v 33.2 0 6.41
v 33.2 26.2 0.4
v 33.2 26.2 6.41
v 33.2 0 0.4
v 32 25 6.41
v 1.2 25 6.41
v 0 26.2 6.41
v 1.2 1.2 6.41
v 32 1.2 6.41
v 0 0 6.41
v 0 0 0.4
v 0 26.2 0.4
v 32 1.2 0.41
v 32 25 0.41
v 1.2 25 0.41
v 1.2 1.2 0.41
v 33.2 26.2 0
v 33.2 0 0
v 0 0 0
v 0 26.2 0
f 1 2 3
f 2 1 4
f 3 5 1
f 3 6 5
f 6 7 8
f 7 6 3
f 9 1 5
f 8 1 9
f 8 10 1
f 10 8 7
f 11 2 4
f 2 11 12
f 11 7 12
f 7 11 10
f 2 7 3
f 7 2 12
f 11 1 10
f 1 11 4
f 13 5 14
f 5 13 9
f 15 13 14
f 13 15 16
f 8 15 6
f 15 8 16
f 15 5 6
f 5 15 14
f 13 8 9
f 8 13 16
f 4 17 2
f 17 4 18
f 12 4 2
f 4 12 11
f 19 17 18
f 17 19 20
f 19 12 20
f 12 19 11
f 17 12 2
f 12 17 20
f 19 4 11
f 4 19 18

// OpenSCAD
// file: ../../Base/Rotation.scad
// Fischertechnik Box Foundation
// Geometry Helpers Rotation

include <PlacementOptions.scad>

// getRotatedSpace(space, rotation=NoRotation)
// Rotates the space dependent on the specified rotation

function getRotatedSpace(space, rotation=NoRotation) = [
    (rotation == Rotate90 || rotation == Rotate270) ? space.y : space.x,
    (rotation == Rotate90 || rotation == Rotate270) ? space.x : space.y
];

// Rotates the given space around the fixed left lower corner
// space = the space the children needs as width/depth list [width,depth]
// rotation = 0 Rotate0 degrees, 1 Rotate90 degrees, 2 Rotate180 degrees, 3 Rotate270 degrees (equivalent to -90)

module RotateFix(space, rotation=NoRotation) {
    dy = (rotation == Rotate0 || rotation == Rotate270) ? 0 :
        (rotation == Rotate90) ? space.x :
        space.y;
    dx = (rotation < Rotate180) ? 0 :
        (rotation == Rotate180) ? space.x :
        space.y;
    
    translate([dx, dy, 0])
        rotate([0, 0, rotations[rotation]])
            children();
}
// file: ../../Base/Alignment.scad
// Fischertechnik Box Foundation
// Geometry Helpers Alignment

include <PlacementOptions.scad>

// getAlignedX(elementWidth, spaceWidth, align=AlignRight, offset=0)
// Gets the aligned X offset of an element with the given
// width in the given space.
// elementWidth = The width of the element to positon
// spaceWidth = The space where the element should be aligned
// align = 0 AlignLeft, 1 AlignCenter, 2 AlignRight
// offset = an optional offset from the aligned position. When
// aligned left or centered, then positive values are in X direction.
// When aligned right then positive values are in negative X direction.

function getAlignedX(elementWidth, spaceWidth, align=AlignRight, offset=0) =
    (align == AlignLeft) ?
        offset :
        ((align == AlignCenter) ?
        (spaceWidth - elementWidth)/2 + offset :
        spaceWidth - offset - elementWidth);

// getAlignedY(elementDepth, spaceDepth, align=AlignTop, offset=0)
// Gets the aligned Y offset of an element with the given
// depth in the given space.
// elementDepth = The depth of the element to positon
// spaceDepth = The space where the element should be aligned
// align = 0 AlignBottom, 1 AlignCenter, 2 AlignTop
// offset = an optional offset from the aligned position. When
// aligned bottom or centered, then positive values are in Y direction.
// When aligned top then positive values are in negative Y direction.

function getAlignedY(elementDepth, spaceDepth, align=AlignTop, offset=0) =
    (align == AlignBottom) ?
        offset :
        ((align == AlignCenter) ?
        (spaceDepth - elementDepth)/2 + offset :
        spaceDepth - offset - elementDepth);
// file: ../../Base/PlacementOptions.scad
// Fischertechnik Box Foundation
// Placement Options

// Alignment
NoAlign = 0;
AlignLeft = 1;
AlignBottom = 2;
AlignCenter = 3;
AlignRight = 4;
AlignTop = 5;

// Element rotation degree steps
rotations = [0, -90, -180, -270];

// Rotation
NoRotation = 0;
Rotate0 = 0;
Rotate90 = 1;
Rotate180 = 2;
Rotate270 = 3;

// Docking (seen from above)
NoDock = -1;
DockLeft = 0;
DockTop = 1;
DockRight = 2;
DockCorner = 2;
DockBottom = 3;

// Web corners
LowerLeft = 0;
UpperLeft = 1;
UpperRight = 2;
LowerRight = 3;

// Web position relative to corner
LeftOfCorner = 0;
RightOfCorner = 1;
// file: ../../Base/Boxes.scad
// Fischertechnik Box Foundation
// Pre-designed Boxes

use <Constants.scad>

include <PlacementOptions.scad>

box190Width = 190;
box190Depth = 130;
box130Width = 130;
box130Depth = 95;

// Values are from an original ec3 box
topBottomDifference = 1.5;
outerHeight = 40;
baseThickness = 1.8;
innerHeight = outerHeight - baseThickness;
stackExcess = 5.7;
radius = 3.5;
wallThickness = 1.5;
tolerance = 0.2;

boxWallThickness = wallThickness;
boxBaseThickness = baseThickness;
boxWebWidth = 3.0;

// getBoxWallThickness()
// Gets the wall thickness of a Fischertechnik Box
function getBoxWallThickness() = boxWallThickness;

// getBoxUsageHeight(height = 38.2)
// Gets the usable height of a Fischertechnik box
// height = Outer height of the box from the bottom to the upper edge.
function getBoxUsageHeight(height = outerHeight) = height - baseThickness - stackExcess;

// getBoxInnerHeight()
// Gets the inner height of a Fischertechnik box, including the stack excess
function getBoxInnerHeight() = innerHeight;

// getBoxBaseThickness()
// Gets the thickness of the Fischertechnik box base.
function getBoxBaseThickness() = boxBaseThickness;

// getBoxWebWidth()
// Gets the width of a box web
function getBoxWebWidth() = boxWebWidth;

// getBox190Space()
// Gets the usable inner space of a Box 190 as an x/y-list
function getBox190Space() = [
    box190Width - 2*getBoxWallThickness() - topBottomDifference, 
    box190Depth - 2*getBoxWallThickness() - topBottomDifference ];

// RoundedCornerPlate(width, depth, height, radius)
// Creates a body plate with rounded corners for a box. Used
// also to create the complete box with the hull module.
// width = Width of the plate
// depth = depth of the plate 
// height = thickness of the plate
// radius = radius of the rounded corner
module RoundedCornerPlate(width, depth, height, radius) {
    translate([radius, radius])
    hull() {
        w = width-2*radius;
        d = depth-2*radius;
        cube([w, d, height]);
        cylinder(height, r=radius, $fn=getFragments());
        translate([w, 0])
            cylinder(height, r=radius, $fn=getFragments());
        translate([w, d])
            cylinder(height, r=radius, $fn=getFragments());
        translate([0, d])
            cylinder(height, r=radius, $fn=getFragments());
    }
}

// BoxBase(width, depth)
// Creates an empty stackable Fischertechnik compatible box
// width = Outer width of the box (190, 130, ...)
// depth = Outer depth of the box (130, 95, ...)

module BoxBase(width, depth, height=outerHeight) {    
    thinPlate = 0.01;

    innerHeight = height - baseThickness;    
    
    module Body(tolerance=tolerance) {
        hull() {
            // Bottom with tolerance to fit into the original boxes when stacked
            translate([-wallThickness+tolerance, -wallThickness+tolerance, -baseThickness])
                RoundedCornerPlate(width-topBottomDifference-2*tolerance, depth-topBottomDifference-2*tolerance, thinPlate, radius);
            
            // Top
            translate([-wallThickness-topBottomDifference/2, -wallThickness-topBottomDifference/2, innerHeight-thinPlate])
                RoundedCornerPlate(width, depth, thinPlate, radius);
         }
    }

    module Cutoff() {
        hull() {
            coWidth = width - 2*wallThickness;
            coDepth = depth - 2*wallThickness;
            
            // Bottom
            RoundedCornerPlate(coWidth-topBottomDifference, coDepth-topBottomDifference, thinPlate, radius);

            // Top
            translate([-topBottomDifference/2, -topBottomDifference/2, innerHeight+thinPlate]) 
                RoundedCornerPlate(coWidth, coDepth, thinPlate, radius);
        }
    }
    
    difference() {        
        Body();
        Cutoff();
        stackOffset = innerHeight - stackExcess;
        translate([0, 0, stackOffset + baseThickness])
            Body(tolerance=0);
    }
}

// Creates the Fischertechnik empty box 130x190 mm and places it at position 0,0
// 190x130 are the outer sizes, the inner space is slightly smaller. Use getBox190Space() to get the inner sizes.
// The box is positioned that the usable inner space is at the 0,0,0 position.

module Box190() {
    BoxBase(box190Width, box190Depth);
}

// Gets the usable inner space of a Box 130 as an x/y-list
function getBox130Space() = [
    box130Width - 2*getBoxWallThickness() - topBottomDifference, 
    box130Depth - 2*getBoxWallThickness() - topBottomDifference ];

// Creates the Fischertechnik empty box 95x130 mm and places it at position 0,0
// 190x130 are the outer sizes, the inner space is slightly smaller. Use getBox190Space() to get the inner sizes.
// The box is positioned that the usable inner space is at the 0,0,0 position.

module Box130() {
    BoxBase(box130Width, box130Depth);
}

// Creates a web at the specified box walls
// corner 0 = LowerLeft, 1 = UpperLeft, 2 = UpperRight, 3 = LowerRight
// side 0 = LeftOfCorner, 1 = RightOfCorner
// distance = Distance in mm from the corner
// boxSpace = inner width and depth of the box (default: Box 190)
// webWidth = length of the web (default is 3 mms)
// webThickness = thickness of the web (default is 1 mm)
// height = Height of the web (standard is getBoxUsageHeight())

module BoxWeb(corner, side, distance, boxSpace=getBox190Space(), webWidth=getBoxWebWidth(), webThickness=1.0, height=getBoxUsageHeight()) {
    sink = getBoxWallThickness()/2;

    width = (corner % 2 == 0) ? 
            (side == LeftOfCorner ? webWidth : webThickness) :
            (side == LeftOfCorner ? webThickness : webWidth);

    depth = (corner % 2 == 0) ? 
            (side == RightOfCorner ? webWidth : webThickness) :
            (side == RightOfCorner ? webThickness : webWidth);
    
    xDiff = corner == LowerLeft ? 
                (side == LeftOfCorner ? -sink : distance) :
            (corner == UpperLeft ?                
                (side == LeftOfCorner ? distance : -sink) :
            (corner == UpperRight ?
                (side == LeftOfCorner ? boxSpace.x-webWidth+sink : boxSpace.x-distance-webThickness) :
                (side == LeftOfCorner ? boxSpace.x-distance-webThickness: boxSpace.x-webWidth+sink)));

    yDiff = corner == LowerLeft ? 
                (side == RightOfCorner ? -sink : distance) :
            (corner == UpperLeft ?
                (side == RightOfCorner ? boxSpace.y-distance-webThickness : boxSpace.y-webWidth+sink) :
            (corner == UpperRight ?
                (side == RightOfCorner ? boxSpace.y-webWidth+sink : boxSpace.y-distance-webThickness) :
                (side == RightOfCorner ? distance : -sink)));
    
    translate([xDiff, yDiff, -getExcess()])
        cube([width, depth, height + 2*getExcess()]);
}
// file: ../../Base/Placement.scad
// Fischertechnik Box Foundation
// Geometry Helpers Placement

use <Constants.scad>
use <Alignment.scad>
use <Rotation.scad>
use <Boxes.scad>

include <PlacementOptions.scad>

// Place(x=0, y=0, elementSpace=[0,0], alignX=AlignLeft, alignY=AlignBottom, rotation=Rotate0, boxSpace=getBox190Space())
// Places the child at the specified position
// y = Y-Position. This is a relative position when an X aligment is specified.
// x = X-Position. This is a relative position when an Y aligment is specified.
// elementSpace = space of the element to be placed [x,y]
// alignX = -1=NoAlign, 0 AlignLeft, 1 AlignCenter, 3 AlignRight (elementSpace and boxSpace required!)
// alignY = -1=NoAlign, 2 AlignBottom, 1 AlignCenter, 4 AlignTop (elementSpace and boxSpace required!)
// rotation = 0 Rotate0 0 degrees, 1 Rotate90 90 degrees, 
// 2 Rotate180 180 degrees, 3 Rotate270 270 degrees (equivalent to -90)
// boxSpace = Inner space of the box where the placement occurs [x,y] - default is Box 190x130 inner space

module Place(x=0, y=0, elementSpace=[0,0], 
  alignX=AlignLeft, alignY=AlignBottom, 
  rotation=NoRotation, boxSpace=getBox190Space()) {

    module Position(x, y, space, rotation=Rotate0) {
        translate([x, y, 0])
            RotateFix(space, rotation)
                children();
    }

    space = getRotatedSpace(elementSpace, rotation);
    alignedX = getAlignedX(space.x, boxSpace.x, alignX, x);
    alignedY = getAlignedY(space.y, boxSpace.y, alignY, y);
    Position(alignedX, alignedY, elementSpace, rotation)
        children();
}

// Center(space=getBox130Space(), elementSpace=[0,0])
// space = Space where the children is centered. For cylinder use centered=true and no elementSpace.
// elementSpace = space of the element to be centered [x,y]

module Center(space=getBox190Space(), elementSpace=[0,0]) {
    Place(elementSpace=elementSpace, boxSpace=space, alignX=AlignCenter, alignY=AlignCenter)
        children();
}

// CenterHorizontal(width=0, y=0, offset=0, space=getBox130Space())
// width = Width of the element to be placed.
// y = Y position of the element
// offset = Offset from the center position (negative will be left of the center)
// space = Space where the element is placed

module CenterHorizontal(width=0, y=0, offset=0, space=getBox190Space()) {
    Place(x=offset, y=y, elementSpace=[width, 0], boxSpace=space, alignX=AlignCenter)
        children(0);
}

// CenterVertical(depth=0, x=0, offset=0, space=getBox130Space())
// depth = Depth of the element to be placed.
// x = X position of the element
// offset = Offset from the center position (negative will be down of the center)
// space = Space where the element is placed

module CenterVertical(depth=0, x=0, offset=0, space=getBox190Space()) {
    Place(x=x, y=offset, elementSpace=[0, depth], boxSpace=space, alignY=AlignCenter)
        children(0);
}

// getIsVertical(align)
// True if the specified alignment needs a vertical orientation for a divider (AlignRight, AlignLeft)

function getIsVertical(align) = (align == AlignRight || align == AlignLeft);

// getIsHorizontal(align)
// True if the specified alignment needs a horizontal orientation for a divider (AlignTop, AlignBottom)

function getIsHorizontal(align) = (align == AlignTop || align == AlignBottom);
// file: ../../Elements/AxisClip10.scad
// Fischertechnik Box Library
// Axis for clip 10
// 31023

use <../ModelBase/Simple.scad>
use <../Base/Constants.scad>

/* [Element Parameters] */
height = 23;
clipHeight = 10;

/* [Hidden] */
width = 12;
depth = 12;
upperDiameter = 3.6;

// getAxisClip10Space()
// Gets the space of a n axis for a clip 10 with spring ring (mot2)

function getAxisClip10Space() = [width, depth, height];

// AxisClip10(height, clipHeight)
// Axis for clip 10 with spring ring (mot2)
// height = Height of the complete axis (standard is 23, in mot3 its only 12)
// clipHeight = Height of the part for the clip (standard is 10, in mot3 its only 7)

module AxisClip10(height=height, clipHeight=clipHeight) {
    LeveledAxisWithSpace(height, height-clipHeight, getAxisClip10Space(), diameter=upperDiameter);
}

// Test
color("lightgray")
AxisClip10(height, clipHeight);
// file: ../../Base/Constants.scad
// Fischertechnik Box Foundation
// Constants

// Constant values necessary for multiple elements

// Base constants
dividerThickness = 1.2;
excess = 0.01;
fragments = 90;
tolerance = 0.8;

// Gets the thickness of a divider 
function getDividerThickness() = dividerThickness;

// Gets the excess that is used to merge walls into each other
function getExcess() = excess;

// Gets amount of fragments of a cylinder
function getFragments() = fragments;

// Gets the inner tolerance of a frame to each side
function getTolerance() = tolerance;


// Fischertechnik specific constants
axisDiameter = 4;
axisBottomDiameter = axisDiameter + 1;
axisTolerance = 0.2;

// Gets axis diameter of Fischertechnik axis
function getAxisDiameter() = axisDiameter;

// Gets axis diameter tolerance (subtracted for element axis)
function getAxisTolerance() = axisTolerance;

// Gets the axis diameter for standing axis
function getStandAxisDiameter() = getAxisDiameter() - getAxisTolerance();

// Gets axis bottom diameter for thicker part at the bottom
function getAxisBottomDiameter() = axisBottomDiameter;

standardEdgeDistance = 2.5;
standardWebDistance = 11.5;
standardCornerLength = 15;

// gets the standard distance to the wall of the box for dockable frames with webs
function getStandardEdgeDistance() = standardEdgeDistance;

// gets the standard distance of each web to the corner of the dockable frame
function getStandardWebDistance() = standardWebDistance;

// gets the standard length of the corner walls of a dockable frame
function getStandardCornerLength() = standardCornerLength;

tubeWallFactor = 0.8;

// gets the wall thickness of a tube.
function getTubeWallThickness() = tubeWallFactor * getDividerThickness();

smallPartsFrameHeight = 20;

// gets the frame height for docked small parts boxes.
function getSmallPartsFrameHeight() = smallPartsFrameHeight;

hubRingDiameter = 19.5;
hubRingLevelDiameter = 21;

// gets the diameter of a tube matching the inner ring of a wheel
function getHubRingDiameter() = hubRingDiameter;

// gets the diameter of a hub tube with a thicker diameter
function getHubRingLevelDiameter() = hubRingLevelDiameter;
// file: ../../Elements/FrameLiftingGear.scad
// Fischertechnik Box Library
// Frame for lifting gear
// 37263, 37268, 37272, 75067

use <../ModelBase/Simple.scad>

/* [Hidden] */
width = 30;
depth = 23;
height = 6;

volume = [width, depth, height];

// getFrameLiftingGearSpace()
// Gets the space the frame for the lifting gear needs

function getFrameLiftingGearSpace() = getFrameOuterVolume(volume);

// FrameLiftingGear()
// Creates a frame for a lifting gear

module FrameLiftingGear() {
    Frame(volume);
}

// Test
color("lightgray")
FrameLiftingGear();
// file: ../TestPrint.scad
// 3D Print Test Base

use <../Base/Constants.scad>

use <../Elements/AxisClip10.scad>

module TestPrint(elementSpace) {
    cube([elementSpace.x, elementSpace.y, 0.4]);
    translate([0,0,0.4+getExcess()]) {
        children();
    }
}

TestPrint(getAxisClip10Space())
    AxisClip10();
// main file
// 3D Print Test
// FrameLiftingGear

use <../TestPrint.scad>
use <../../Elements/FrameLiftingGear.scad>

TestPrint(getFrameLiftingGearSpace())
    FrameLiftingGear();
